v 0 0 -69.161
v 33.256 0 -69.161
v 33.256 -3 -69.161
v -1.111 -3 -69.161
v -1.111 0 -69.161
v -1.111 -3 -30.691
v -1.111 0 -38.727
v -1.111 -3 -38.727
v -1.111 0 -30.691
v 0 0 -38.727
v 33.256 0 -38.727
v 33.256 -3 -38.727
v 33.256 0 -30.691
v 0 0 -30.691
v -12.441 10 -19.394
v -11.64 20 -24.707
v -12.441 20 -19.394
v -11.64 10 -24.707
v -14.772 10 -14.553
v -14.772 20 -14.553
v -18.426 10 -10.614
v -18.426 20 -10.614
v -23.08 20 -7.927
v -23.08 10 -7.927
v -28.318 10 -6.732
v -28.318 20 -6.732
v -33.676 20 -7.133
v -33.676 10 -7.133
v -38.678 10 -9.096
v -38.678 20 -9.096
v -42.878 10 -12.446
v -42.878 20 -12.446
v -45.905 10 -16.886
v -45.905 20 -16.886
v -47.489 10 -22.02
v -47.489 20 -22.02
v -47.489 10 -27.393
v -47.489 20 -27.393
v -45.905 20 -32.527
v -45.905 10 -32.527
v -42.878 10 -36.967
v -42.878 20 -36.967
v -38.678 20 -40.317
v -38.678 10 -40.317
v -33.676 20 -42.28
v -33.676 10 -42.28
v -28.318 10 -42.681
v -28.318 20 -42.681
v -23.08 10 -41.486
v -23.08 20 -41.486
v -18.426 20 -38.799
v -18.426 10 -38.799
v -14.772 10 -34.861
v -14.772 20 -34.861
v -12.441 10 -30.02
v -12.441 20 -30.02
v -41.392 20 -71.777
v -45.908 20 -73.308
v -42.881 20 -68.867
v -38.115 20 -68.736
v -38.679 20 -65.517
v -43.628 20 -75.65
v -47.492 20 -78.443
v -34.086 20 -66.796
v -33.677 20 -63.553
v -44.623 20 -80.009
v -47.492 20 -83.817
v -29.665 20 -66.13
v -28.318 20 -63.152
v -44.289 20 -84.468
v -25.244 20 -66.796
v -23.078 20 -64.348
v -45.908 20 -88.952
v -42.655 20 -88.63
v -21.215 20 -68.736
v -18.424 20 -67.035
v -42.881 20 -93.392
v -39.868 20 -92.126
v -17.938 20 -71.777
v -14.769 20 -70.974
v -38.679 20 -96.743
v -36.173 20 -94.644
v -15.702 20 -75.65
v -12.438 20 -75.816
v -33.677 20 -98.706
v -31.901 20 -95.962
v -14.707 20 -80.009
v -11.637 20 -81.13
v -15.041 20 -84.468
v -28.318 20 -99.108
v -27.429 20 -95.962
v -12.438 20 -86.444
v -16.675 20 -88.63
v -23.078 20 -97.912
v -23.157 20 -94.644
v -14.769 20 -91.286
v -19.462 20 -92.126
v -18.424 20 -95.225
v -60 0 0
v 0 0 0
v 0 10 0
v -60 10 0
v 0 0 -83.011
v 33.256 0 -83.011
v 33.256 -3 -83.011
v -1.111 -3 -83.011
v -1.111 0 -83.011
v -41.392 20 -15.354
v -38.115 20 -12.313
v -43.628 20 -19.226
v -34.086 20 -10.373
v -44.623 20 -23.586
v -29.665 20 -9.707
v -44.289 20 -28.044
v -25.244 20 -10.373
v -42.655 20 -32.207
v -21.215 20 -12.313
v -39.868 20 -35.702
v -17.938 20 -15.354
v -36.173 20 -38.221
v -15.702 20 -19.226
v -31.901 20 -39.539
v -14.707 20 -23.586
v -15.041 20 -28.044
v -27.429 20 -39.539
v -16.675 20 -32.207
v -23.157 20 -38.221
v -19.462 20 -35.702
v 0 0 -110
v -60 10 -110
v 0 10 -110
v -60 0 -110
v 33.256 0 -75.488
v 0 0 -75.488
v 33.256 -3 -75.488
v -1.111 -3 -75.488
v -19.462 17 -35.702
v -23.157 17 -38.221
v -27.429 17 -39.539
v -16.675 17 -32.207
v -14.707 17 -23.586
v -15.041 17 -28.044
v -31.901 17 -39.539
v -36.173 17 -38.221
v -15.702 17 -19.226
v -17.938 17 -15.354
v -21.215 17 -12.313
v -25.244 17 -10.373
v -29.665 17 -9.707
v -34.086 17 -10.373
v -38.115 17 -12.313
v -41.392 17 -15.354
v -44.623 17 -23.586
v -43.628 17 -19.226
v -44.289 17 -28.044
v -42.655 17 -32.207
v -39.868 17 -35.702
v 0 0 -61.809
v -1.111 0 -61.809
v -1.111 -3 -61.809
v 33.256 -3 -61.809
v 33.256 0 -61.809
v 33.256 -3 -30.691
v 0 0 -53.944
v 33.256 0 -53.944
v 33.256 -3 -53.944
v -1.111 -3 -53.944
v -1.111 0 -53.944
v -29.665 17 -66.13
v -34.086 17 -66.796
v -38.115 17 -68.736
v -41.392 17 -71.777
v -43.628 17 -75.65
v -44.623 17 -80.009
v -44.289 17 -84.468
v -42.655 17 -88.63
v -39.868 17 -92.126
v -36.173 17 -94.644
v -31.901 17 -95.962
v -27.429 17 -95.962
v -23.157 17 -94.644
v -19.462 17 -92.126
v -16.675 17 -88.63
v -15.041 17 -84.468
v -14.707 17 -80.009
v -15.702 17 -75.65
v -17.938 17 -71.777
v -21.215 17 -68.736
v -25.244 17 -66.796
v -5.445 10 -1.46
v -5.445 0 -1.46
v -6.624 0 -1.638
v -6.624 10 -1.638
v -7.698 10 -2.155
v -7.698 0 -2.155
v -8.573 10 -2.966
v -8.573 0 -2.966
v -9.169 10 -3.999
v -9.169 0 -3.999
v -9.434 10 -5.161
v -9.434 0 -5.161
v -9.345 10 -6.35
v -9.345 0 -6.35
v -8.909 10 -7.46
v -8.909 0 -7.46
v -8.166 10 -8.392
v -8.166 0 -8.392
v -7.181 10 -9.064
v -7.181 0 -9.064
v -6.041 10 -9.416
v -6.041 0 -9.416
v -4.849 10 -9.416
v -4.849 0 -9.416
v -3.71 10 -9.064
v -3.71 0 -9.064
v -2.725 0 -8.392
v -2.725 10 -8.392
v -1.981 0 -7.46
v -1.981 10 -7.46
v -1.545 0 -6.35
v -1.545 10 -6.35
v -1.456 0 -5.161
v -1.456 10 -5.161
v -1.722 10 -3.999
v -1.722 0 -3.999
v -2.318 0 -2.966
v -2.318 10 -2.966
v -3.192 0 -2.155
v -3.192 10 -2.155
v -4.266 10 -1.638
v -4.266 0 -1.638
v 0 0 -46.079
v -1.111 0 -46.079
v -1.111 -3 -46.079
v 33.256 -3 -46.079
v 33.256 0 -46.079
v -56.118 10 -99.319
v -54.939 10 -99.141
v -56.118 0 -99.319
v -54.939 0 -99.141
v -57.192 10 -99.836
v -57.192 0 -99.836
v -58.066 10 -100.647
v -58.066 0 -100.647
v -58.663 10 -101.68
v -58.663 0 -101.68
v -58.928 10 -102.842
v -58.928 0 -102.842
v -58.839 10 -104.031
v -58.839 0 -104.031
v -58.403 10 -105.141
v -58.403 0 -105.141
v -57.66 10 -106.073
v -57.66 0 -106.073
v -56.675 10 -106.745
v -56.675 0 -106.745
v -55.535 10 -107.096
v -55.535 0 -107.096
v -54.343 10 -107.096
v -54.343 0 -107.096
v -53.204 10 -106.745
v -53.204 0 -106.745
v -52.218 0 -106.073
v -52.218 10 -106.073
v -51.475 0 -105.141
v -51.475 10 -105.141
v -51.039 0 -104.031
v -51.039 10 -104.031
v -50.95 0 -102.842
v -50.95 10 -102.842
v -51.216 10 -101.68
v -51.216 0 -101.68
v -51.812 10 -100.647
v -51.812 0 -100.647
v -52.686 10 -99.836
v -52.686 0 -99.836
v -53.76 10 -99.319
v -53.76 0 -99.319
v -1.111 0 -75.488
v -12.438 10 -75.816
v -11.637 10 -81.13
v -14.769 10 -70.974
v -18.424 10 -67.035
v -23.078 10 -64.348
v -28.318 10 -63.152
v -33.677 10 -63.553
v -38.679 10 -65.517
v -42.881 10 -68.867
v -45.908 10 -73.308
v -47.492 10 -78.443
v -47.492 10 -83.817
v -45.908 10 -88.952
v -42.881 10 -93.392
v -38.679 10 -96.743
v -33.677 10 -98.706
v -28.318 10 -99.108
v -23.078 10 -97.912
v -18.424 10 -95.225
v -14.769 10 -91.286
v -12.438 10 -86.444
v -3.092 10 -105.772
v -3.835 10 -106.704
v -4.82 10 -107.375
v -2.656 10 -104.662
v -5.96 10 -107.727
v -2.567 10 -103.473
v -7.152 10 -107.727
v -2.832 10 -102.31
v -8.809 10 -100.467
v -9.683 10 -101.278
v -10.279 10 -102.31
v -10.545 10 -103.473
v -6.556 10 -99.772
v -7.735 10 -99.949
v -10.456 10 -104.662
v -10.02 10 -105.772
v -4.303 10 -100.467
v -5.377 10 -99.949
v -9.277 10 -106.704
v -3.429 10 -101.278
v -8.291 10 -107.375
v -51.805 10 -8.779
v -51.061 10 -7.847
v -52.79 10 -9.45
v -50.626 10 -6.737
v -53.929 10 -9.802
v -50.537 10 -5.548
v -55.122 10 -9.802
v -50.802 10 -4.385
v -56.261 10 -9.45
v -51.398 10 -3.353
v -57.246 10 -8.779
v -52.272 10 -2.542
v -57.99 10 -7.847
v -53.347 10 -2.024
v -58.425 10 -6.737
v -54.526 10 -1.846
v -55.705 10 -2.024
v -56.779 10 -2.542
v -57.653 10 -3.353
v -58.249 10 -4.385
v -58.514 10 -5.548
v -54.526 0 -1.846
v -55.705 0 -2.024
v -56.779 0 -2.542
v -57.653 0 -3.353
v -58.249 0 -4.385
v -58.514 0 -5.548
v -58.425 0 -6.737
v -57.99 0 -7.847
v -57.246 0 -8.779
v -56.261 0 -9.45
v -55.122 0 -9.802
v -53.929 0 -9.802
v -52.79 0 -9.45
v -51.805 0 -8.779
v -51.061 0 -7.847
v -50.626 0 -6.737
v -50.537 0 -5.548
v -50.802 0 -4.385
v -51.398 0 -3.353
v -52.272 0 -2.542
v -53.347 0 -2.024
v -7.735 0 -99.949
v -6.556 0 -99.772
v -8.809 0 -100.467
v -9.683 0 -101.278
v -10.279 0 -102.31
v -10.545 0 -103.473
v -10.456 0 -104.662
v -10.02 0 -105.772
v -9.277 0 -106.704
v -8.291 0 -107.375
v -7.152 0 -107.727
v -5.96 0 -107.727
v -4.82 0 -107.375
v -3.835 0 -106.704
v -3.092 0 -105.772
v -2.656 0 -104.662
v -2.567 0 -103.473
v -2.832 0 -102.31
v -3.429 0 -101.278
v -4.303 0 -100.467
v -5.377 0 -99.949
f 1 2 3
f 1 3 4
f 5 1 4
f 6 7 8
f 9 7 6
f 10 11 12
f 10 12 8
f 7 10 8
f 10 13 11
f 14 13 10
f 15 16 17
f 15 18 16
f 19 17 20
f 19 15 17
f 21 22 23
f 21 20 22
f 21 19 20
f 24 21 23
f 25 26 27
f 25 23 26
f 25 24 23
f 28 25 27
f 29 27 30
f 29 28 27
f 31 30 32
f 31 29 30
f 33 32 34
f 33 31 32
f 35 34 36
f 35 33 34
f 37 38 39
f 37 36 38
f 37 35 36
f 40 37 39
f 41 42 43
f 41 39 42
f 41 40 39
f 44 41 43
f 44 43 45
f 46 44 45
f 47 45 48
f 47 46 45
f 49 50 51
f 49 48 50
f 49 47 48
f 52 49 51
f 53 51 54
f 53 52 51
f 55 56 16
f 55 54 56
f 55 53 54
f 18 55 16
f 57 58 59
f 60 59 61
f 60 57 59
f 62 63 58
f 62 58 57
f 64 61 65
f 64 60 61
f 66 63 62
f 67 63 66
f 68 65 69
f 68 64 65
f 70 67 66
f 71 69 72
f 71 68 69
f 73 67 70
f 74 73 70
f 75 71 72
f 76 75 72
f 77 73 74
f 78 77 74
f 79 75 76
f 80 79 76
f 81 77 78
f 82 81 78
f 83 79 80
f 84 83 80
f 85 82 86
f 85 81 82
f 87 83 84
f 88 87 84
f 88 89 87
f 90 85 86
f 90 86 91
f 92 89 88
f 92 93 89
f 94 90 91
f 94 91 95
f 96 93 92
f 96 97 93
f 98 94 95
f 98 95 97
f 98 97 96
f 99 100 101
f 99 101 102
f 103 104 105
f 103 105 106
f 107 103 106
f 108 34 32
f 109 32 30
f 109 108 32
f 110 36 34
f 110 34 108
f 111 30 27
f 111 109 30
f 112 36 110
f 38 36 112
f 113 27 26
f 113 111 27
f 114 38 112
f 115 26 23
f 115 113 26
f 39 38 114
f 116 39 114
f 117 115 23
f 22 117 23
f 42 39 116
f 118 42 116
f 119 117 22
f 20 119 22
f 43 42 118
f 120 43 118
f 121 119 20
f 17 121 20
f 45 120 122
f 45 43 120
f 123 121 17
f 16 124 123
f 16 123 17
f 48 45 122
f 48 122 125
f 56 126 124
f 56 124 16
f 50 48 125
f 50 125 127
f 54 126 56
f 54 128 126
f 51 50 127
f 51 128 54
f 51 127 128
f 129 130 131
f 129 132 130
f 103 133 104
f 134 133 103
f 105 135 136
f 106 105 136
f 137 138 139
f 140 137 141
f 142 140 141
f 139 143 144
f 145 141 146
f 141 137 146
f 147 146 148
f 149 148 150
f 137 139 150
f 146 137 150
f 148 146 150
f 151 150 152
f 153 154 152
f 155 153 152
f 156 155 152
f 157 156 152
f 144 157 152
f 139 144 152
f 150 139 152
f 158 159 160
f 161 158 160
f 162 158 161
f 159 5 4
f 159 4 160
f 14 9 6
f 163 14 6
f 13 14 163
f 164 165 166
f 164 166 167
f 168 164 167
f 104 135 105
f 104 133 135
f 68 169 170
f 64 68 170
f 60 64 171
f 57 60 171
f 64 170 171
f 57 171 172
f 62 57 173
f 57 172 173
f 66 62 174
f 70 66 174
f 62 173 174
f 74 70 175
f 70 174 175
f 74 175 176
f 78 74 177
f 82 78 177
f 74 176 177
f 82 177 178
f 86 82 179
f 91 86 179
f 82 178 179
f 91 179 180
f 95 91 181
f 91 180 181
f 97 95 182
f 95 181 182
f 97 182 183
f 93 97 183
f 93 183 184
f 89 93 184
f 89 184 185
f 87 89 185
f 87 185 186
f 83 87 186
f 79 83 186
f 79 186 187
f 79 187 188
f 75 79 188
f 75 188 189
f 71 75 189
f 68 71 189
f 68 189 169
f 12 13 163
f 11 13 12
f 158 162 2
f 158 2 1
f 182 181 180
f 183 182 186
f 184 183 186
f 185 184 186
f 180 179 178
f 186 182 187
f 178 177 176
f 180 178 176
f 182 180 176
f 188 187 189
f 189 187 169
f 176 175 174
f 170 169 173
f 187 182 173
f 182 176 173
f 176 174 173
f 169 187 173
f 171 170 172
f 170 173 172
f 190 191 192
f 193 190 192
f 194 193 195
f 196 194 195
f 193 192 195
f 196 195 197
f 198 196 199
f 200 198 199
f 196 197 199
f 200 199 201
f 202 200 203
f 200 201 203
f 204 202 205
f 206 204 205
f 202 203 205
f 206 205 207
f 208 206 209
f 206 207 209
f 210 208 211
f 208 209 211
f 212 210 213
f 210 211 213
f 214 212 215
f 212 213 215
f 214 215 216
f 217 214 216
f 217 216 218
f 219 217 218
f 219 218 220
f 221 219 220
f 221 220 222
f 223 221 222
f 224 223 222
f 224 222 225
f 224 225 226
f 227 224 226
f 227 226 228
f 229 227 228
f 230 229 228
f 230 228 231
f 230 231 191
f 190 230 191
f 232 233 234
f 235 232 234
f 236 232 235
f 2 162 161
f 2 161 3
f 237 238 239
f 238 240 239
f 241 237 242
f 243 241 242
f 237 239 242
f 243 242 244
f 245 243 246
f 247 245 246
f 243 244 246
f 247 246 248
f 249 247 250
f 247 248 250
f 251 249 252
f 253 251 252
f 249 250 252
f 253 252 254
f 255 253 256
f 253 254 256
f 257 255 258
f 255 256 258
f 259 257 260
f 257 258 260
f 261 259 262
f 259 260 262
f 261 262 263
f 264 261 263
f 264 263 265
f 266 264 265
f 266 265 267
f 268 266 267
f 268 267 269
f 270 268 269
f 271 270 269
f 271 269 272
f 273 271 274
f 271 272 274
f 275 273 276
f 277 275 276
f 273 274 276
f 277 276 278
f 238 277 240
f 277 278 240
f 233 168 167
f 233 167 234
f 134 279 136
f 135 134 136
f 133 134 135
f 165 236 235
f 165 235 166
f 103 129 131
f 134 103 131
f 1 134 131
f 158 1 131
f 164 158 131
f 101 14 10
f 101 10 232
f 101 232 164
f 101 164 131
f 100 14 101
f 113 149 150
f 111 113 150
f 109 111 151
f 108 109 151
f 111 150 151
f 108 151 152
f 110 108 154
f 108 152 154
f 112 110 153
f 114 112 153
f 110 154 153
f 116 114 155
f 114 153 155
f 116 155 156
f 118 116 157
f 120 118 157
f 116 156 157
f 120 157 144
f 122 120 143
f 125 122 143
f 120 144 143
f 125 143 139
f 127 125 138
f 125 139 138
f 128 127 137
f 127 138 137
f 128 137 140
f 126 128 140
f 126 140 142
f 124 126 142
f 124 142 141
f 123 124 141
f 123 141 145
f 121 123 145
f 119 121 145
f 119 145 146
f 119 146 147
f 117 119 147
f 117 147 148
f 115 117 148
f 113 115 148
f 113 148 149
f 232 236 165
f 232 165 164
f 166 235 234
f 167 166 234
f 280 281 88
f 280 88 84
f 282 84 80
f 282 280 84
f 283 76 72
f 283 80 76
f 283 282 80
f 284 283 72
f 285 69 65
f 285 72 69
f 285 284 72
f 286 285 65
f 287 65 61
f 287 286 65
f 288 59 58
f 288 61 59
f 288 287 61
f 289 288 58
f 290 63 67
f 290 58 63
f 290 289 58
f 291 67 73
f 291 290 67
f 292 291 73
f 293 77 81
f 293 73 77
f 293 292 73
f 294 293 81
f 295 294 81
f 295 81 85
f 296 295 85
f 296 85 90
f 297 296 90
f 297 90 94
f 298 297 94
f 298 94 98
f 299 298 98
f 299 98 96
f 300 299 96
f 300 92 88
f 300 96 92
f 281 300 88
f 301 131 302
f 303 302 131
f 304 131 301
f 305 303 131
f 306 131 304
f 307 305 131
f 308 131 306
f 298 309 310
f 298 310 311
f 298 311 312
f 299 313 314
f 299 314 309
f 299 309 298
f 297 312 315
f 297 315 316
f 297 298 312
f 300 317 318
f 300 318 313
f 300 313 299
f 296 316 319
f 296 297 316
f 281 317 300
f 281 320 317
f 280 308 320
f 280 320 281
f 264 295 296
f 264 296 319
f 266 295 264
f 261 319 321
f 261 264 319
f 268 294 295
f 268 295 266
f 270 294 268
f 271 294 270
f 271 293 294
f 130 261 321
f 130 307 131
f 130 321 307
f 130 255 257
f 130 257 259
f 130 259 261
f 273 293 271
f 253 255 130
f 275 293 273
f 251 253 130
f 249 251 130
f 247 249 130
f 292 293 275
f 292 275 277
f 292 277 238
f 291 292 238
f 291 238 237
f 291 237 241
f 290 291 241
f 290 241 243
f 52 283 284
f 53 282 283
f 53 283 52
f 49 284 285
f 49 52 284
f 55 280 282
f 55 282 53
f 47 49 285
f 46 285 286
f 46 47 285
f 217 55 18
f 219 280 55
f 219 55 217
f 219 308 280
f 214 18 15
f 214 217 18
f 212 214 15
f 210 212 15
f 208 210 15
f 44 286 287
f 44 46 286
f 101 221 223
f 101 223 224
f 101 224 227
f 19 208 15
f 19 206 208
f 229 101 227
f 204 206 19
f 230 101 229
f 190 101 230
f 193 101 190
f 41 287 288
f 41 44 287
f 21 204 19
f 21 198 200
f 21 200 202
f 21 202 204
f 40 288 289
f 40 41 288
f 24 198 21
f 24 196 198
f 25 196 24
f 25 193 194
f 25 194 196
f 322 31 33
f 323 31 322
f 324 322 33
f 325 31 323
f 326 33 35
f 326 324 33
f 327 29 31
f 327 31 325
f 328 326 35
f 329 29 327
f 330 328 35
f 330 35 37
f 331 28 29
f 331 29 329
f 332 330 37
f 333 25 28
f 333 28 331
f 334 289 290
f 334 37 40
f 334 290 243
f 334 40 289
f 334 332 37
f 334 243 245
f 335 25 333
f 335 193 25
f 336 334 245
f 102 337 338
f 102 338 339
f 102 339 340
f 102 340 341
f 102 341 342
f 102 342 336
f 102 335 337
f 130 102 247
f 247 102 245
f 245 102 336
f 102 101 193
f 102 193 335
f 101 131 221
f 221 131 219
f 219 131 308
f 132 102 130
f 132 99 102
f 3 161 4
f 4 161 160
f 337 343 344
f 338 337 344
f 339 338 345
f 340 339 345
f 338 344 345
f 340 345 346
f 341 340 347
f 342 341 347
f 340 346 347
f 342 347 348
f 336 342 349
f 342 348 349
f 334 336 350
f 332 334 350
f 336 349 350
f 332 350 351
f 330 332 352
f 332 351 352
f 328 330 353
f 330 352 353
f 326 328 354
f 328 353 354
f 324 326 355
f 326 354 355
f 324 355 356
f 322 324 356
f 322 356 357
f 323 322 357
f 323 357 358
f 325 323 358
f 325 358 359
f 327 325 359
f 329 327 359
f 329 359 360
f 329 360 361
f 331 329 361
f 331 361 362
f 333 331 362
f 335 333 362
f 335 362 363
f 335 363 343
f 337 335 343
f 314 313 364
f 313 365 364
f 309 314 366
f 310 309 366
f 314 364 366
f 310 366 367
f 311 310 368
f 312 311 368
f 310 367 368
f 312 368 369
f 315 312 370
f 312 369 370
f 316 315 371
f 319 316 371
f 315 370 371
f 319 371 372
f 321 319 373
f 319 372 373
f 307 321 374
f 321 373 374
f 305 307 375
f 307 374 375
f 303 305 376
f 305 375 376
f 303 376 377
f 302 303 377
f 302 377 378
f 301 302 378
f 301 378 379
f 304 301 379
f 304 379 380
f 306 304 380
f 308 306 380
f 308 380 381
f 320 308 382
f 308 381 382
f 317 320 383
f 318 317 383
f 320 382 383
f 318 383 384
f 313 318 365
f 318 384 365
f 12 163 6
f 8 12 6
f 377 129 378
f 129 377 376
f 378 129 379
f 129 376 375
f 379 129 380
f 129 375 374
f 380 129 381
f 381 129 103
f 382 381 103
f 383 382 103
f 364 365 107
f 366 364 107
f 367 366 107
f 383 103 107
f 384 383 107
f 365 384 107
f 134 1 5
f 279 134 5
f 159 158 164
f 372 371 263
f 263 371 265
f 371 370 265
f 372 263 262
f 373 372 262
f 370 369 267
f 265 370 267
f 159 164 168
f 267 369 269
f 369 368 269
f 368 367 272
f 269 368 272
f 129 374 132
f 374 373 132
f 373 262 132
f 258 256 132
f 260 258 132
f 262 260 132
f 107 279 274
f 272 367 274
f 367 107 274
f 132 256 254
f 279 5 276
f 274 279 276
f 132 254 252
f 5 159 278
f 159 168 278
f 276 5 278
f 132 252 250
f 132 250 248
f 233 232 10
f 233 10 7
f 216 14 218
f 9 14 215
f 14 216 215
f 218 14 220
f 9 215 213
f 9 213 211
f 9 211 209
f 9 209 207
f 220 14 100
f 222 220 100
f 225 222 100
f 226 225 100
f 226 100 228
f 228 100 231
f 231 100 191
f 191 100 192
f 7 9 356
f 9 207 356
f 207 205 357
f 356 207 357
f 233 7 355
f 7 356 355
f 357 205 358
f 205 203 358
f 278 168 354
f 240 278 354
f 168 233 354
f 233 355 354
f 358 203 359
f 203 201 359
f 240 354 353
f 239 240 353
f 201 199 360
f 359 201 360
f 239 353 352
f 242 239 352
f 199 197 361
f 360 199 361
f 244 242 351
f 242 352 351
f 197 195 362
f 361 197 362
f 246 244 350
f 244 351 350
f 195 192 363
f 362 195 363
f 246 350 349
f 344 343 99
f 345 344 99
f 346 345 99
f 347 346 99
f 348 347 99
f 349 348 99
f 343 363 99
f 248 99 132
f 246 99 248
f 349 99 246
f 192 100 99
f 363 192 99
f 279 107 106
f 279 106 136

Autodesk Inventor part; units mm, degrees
ref_plane "YZ Plane" through (0, 0, 0) normal (1, 0, 0) x (0, 1, 0)
ref_plane "XZ Plane" through (0, 0, 0) normal (0, 1, 0) x (-1, 0, 0)
ref_plane "XY Plane" through (0, 0, 0) normal (0, 0, 1) x (1, 0, 0)
sketch "Sketch1" plane through (0, 0, 0) normal (0, 1, 0) x (-1, 0, 0)
  line L0 (0, 0) -> (60, 0)
  line L1 (60, 0) -> (60, -110)
  line L2 (60, -110) -> (0, -110)
  line L3 (0, -110) -> (0, 0)
  dimension "d0" = 110
  dimension "d1" = 60
sketch "Sketch2" plane through (0, 0, 0) normal (0, 1, 0) x (-1, 0, 0)
  line L0 (1.1114, -30.6908) -> (-33.2555, -30.6908)
  line L1 (-33.2555, -30.6908) -> (-33.2555, -38.7269)
  line L2 (-33.2555, -38.7269) -> (1.1114, -38.7269)
  line L3 (1.1114, -38.7269) -> (1.1114, -30.6908)
  line L4 (1.1114, -46.079) -> (-33.2555, -46.079)
  line L5 (-33.2555, -46.079) -> (-33.2555, -53.9441)
  line L6 (-33.2555, -53.9441) -> (1.1114, -53.9441)
  line L7 (1.1114, -53.9441) -> (1.1114, -46.079)
  line L8 (1.1114, -61.8091) -> (-33.2555, -61.8091)
  line L9 (-33.2555, -61.8091) -> (-33.2555, -69.1613)
  line L10 (-33.2555, -69.1613) -> (1.1114, -69.1613)
  line L11 (1.1114, -69.1613) -> (1.1114, -61.8091)
  line L12 (1.1114, -75.4875) -> (-33.2555, -75.4875)
  line L13 (-33.2555, -75.4875) -> (-33.2555, -83.0106)
  line L14 (-33.2555, -83.0106) -> (1.1114, -83.0106)
  line L15 (1.1114, -83.0106) -> (1.1114, -75.4875)
  point P0 (0, 0)
extrude "Extrusion1" add sketch "Sketch1" along normal blind 10
extrude "Extrusion2" add sketch "Sketch2" against normal blind 3
sketch "Sketch3" plane through (0, 10, 0) normal (0, 1, 0) x (1, 0, 0)
  circle A0 centre (-29.665, 24.7066) radius 18.0252
  circle A1 centre (-29.665, 81.1298) radius 18.0284
  point P0 (0, 0)
extrude "Extrusion3" add sketch "Sketch3" along normal blind 10
sketch "Sketch4" plane through (-29.665, 20, -24.7066) normal (0, 1, 0) x (1, 0, 0)
  point P0 (29.665, -24.7066)
sketch "Sketch5" plane through (-29.665, 20, -24.7066) normal (0, 1, 0) x (1, 0, 0)
  circle A0 centre (0, 0) radius 18.0252 projected
  point P0 (29.665, -24.7066)
hole "Hole1" at (-29.665, 20, -24.7066) direction (0, -1, 0) diameter 30 depth 3
sketch "Sketch6" plane through (-29.665, 20, -81.1298) normal (0, 1, 0) x (1, 0, 0)
  circle A0 centre (0, 0) radius 18.0284 projected
  point P0 (29.665, -81.1298)
hole "Hole2" at (-29.665, 20, -81.1298) direction (0, -1, 0) diameter 30 depth 3
sketch "Sketch7" plane through (0, 10, 0) normal (0, 1, 0) x (1, 0, 0)
  point P0 (0, 0)
  point P1 (-54.5256, 5.8465)
  point P2 (-54.9391, 103.1409)
  point P3 (-6.5559, 103.7715)
  point P4 (-5.4452, 5.4602)
hole "Hole3" at (-54.5256, 10, -5.8465) at (-54.9391, 10, -103.1409) at (-6.5559, 10, -103.7715) at (-5.4452, 10, -5.4602) direction (0, -1, 0) diameter 8 end through all
sketch "Sketch8" plane through (0, 10, 0) normal (0, 1, 0) x (1, 0, 0)
  line L0 (-57.5346, 24.8775) -> (-57.5346, 80.9707) construction
  line L1 (-57.5346, 80.9707) -> (-48.1627, 80.9707) construction
  line L2 (-48.1627, 80.9707) -> (-48.1627, 24.8775) construction
  line L3 (-48.1627, 24.8775) -> (-57.5346, 24.8775) construction
  point P0 (0, 0)
properties part number "ultrasonic now"
